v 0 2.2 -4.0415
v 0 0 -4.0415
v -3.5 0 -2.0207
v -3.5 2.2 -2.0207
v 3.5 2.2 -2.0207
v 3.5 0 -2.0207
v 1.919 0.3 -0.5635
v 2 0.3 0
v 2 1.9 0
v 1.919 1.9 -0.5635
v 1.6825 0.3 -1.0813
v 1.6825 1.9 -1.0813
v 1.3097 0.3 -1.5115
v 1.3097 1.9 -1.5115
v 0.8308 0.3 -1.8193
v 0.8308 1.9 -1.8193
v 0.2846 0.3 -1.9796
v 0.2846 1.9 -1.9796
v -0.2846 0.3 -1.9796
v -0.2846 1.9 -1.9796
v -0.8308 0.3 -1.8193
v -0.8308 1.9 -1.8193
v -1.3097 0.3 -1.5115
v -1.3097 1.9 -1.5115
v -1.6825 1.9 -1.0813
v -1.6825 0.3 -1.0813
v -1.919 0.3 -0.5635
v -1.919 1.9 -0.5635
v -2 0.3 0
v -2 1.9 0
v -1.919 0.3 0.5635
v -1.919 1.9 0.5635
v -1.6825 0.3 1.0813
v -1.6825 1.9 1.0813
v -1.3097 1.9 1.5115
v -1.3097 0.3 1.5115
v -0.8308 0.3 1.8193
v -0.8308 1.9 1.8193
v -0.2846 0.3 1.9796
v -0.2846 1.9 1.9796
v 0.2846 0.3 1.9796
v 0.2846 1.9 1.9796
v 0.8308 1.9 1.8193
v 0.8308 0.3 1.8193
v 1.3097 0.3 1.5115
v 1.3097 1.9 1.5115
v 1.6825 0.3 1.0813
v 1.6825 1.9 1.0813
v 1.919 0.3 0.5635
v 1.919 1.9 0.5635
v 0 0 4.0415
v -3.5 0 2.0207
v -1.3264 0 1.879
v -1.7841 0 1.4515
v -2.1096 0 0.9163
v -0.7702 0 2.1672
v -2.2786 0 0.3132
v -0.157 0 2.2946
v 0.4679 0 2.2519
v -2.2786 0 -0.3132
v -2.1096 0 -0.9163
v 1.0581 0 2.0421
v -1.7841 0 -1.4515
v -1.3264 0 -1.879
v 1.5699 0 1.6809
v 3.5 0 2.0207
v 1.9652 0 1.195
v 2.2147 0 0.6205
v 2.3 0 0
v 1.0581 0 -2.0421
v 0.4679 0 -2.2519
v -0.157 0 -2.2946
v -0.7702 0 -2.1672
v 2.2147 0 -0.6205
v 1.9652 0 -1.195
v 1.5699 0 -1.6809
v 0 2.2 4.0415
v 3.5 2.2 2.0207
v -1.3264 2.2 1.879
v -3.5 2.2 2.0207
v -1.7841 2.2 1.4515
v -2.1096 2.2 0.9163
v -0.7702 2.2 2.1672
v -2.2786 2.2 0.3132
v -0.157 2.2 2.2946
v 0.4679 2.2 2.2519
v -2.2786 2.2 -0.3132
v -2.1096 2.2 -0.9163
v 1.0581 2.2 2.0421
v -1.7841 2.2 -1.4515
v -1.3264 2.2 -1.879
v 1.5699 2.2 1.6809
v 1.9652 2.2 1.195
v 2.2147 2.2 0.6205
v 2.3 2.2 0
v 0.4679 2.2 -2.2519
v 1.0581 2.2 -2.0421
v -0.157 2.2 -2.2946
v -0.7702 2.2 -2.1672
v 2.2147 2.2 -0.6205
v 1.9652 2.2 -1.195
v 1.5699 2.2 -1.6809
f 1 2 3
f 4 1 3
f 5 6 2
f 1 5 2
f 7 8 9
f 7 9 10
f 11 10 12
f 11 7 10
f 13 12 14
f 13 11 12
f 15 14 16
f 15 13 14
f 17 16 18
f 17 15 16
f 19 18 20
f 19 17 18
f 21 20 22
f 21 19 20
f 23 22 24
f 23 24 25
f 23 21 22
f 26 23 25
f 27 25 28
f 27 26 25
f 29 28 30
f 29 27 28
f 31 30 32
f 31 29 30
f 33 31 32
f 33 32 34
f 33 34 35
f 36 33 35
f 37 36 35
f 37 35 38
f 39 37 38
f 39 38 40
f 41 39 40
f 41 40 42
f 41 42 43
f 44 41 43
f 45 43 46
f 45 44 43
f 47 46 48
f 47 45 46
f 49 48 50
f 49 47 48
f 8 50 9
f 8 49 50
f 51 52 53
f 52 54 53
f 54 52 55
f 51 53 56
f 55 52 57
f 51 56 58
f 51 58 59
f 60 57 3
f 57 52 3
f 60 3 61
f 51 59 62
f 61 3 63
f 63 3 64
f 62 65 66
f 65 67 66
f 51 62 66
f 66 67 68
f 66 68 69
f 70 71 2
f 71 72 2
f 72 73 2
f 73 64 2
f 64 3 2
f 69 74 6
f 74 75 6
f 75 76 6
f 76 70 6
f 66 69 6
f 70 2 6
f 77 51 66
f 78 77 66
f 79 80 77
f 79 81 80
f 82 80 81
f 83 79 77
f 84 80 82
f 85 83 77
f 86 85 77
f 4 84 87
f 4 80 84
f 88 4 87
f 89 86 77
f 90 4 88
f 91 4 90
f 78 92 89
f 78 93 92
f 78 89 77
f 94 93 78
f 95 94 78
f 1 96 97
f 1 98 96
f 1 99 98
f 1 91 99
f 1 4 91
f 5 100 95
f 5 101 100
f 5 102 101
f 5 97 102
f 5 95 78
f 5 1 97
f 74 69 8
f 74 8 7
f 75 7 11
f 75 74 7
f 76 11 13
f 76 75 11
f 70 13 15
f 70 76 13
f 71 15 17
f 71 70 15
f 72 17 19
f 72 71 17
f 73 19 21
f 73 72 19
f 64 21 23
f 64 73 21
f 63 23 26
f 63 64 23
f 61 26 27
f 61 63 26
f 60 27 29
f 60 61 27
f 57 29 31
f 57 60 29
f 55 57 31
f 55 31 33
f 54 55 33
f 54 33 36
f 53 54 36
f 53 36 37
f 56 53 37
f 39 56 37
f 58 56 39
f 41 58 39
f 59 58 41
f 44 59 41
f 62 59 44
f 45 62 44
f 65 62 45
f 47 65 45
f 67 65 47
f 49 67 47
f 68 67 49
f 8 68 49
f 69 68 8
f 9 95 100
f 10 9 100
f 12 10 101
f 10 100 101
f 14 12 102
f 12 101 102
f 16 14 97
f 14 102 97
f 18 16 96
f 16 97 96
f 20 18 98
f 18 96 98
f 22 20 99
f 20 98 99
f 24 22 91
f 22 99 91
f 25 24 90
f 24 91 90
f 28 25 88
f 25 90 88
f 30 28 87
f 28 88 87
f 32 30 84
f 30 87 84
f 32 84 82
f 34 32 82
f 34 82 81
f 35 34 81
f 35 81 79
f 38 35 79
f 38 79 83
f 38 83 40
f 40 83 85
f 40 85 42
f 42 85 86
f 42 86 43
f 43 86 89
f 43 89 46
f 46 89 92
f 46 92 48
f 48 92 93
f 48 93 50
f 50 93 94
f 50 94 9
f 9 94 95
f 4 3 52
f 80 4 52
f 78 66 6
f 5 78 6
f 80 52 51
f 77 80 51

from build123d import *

# Parameters (mm, degrees)
SKETCH_1_R      = 2
EXTRUDE_1_DEPTH = 2.2
CHAMFER_1_SIZE  = 0.3


with BuildPart() as part:
    # Эскиз1 → Бобышка-Вытянуть1 (new body)
    with BuildSketch(Plane(origin=(0, 0, 0), x_dir=(1, 0, 0), z_dir=(0, 1, 0))):
        Polygon((-3.5, 2.020725942), (-3.5, -2.020725942), (0, -4.041451884), (3.5, -2.020725942), (3.5, 2.020725942), (0, 4.041451884), align=None)
        Circle(SKETCH_1_R, mode=Mode.SUBTRACT)
    extrude(amount=EXTRUDE_1_DEPTH)

    # Фаска1
    chamfer_1_edges = [part.edges().sort_by_distance(p)[0] for p in [
        (-2, 0, 0),
        (-2, 2.2, 0),
    ]]
    chamfer(chamfer_1_edges, length=CHAMFER_1_SIZE)


solid = part.part
